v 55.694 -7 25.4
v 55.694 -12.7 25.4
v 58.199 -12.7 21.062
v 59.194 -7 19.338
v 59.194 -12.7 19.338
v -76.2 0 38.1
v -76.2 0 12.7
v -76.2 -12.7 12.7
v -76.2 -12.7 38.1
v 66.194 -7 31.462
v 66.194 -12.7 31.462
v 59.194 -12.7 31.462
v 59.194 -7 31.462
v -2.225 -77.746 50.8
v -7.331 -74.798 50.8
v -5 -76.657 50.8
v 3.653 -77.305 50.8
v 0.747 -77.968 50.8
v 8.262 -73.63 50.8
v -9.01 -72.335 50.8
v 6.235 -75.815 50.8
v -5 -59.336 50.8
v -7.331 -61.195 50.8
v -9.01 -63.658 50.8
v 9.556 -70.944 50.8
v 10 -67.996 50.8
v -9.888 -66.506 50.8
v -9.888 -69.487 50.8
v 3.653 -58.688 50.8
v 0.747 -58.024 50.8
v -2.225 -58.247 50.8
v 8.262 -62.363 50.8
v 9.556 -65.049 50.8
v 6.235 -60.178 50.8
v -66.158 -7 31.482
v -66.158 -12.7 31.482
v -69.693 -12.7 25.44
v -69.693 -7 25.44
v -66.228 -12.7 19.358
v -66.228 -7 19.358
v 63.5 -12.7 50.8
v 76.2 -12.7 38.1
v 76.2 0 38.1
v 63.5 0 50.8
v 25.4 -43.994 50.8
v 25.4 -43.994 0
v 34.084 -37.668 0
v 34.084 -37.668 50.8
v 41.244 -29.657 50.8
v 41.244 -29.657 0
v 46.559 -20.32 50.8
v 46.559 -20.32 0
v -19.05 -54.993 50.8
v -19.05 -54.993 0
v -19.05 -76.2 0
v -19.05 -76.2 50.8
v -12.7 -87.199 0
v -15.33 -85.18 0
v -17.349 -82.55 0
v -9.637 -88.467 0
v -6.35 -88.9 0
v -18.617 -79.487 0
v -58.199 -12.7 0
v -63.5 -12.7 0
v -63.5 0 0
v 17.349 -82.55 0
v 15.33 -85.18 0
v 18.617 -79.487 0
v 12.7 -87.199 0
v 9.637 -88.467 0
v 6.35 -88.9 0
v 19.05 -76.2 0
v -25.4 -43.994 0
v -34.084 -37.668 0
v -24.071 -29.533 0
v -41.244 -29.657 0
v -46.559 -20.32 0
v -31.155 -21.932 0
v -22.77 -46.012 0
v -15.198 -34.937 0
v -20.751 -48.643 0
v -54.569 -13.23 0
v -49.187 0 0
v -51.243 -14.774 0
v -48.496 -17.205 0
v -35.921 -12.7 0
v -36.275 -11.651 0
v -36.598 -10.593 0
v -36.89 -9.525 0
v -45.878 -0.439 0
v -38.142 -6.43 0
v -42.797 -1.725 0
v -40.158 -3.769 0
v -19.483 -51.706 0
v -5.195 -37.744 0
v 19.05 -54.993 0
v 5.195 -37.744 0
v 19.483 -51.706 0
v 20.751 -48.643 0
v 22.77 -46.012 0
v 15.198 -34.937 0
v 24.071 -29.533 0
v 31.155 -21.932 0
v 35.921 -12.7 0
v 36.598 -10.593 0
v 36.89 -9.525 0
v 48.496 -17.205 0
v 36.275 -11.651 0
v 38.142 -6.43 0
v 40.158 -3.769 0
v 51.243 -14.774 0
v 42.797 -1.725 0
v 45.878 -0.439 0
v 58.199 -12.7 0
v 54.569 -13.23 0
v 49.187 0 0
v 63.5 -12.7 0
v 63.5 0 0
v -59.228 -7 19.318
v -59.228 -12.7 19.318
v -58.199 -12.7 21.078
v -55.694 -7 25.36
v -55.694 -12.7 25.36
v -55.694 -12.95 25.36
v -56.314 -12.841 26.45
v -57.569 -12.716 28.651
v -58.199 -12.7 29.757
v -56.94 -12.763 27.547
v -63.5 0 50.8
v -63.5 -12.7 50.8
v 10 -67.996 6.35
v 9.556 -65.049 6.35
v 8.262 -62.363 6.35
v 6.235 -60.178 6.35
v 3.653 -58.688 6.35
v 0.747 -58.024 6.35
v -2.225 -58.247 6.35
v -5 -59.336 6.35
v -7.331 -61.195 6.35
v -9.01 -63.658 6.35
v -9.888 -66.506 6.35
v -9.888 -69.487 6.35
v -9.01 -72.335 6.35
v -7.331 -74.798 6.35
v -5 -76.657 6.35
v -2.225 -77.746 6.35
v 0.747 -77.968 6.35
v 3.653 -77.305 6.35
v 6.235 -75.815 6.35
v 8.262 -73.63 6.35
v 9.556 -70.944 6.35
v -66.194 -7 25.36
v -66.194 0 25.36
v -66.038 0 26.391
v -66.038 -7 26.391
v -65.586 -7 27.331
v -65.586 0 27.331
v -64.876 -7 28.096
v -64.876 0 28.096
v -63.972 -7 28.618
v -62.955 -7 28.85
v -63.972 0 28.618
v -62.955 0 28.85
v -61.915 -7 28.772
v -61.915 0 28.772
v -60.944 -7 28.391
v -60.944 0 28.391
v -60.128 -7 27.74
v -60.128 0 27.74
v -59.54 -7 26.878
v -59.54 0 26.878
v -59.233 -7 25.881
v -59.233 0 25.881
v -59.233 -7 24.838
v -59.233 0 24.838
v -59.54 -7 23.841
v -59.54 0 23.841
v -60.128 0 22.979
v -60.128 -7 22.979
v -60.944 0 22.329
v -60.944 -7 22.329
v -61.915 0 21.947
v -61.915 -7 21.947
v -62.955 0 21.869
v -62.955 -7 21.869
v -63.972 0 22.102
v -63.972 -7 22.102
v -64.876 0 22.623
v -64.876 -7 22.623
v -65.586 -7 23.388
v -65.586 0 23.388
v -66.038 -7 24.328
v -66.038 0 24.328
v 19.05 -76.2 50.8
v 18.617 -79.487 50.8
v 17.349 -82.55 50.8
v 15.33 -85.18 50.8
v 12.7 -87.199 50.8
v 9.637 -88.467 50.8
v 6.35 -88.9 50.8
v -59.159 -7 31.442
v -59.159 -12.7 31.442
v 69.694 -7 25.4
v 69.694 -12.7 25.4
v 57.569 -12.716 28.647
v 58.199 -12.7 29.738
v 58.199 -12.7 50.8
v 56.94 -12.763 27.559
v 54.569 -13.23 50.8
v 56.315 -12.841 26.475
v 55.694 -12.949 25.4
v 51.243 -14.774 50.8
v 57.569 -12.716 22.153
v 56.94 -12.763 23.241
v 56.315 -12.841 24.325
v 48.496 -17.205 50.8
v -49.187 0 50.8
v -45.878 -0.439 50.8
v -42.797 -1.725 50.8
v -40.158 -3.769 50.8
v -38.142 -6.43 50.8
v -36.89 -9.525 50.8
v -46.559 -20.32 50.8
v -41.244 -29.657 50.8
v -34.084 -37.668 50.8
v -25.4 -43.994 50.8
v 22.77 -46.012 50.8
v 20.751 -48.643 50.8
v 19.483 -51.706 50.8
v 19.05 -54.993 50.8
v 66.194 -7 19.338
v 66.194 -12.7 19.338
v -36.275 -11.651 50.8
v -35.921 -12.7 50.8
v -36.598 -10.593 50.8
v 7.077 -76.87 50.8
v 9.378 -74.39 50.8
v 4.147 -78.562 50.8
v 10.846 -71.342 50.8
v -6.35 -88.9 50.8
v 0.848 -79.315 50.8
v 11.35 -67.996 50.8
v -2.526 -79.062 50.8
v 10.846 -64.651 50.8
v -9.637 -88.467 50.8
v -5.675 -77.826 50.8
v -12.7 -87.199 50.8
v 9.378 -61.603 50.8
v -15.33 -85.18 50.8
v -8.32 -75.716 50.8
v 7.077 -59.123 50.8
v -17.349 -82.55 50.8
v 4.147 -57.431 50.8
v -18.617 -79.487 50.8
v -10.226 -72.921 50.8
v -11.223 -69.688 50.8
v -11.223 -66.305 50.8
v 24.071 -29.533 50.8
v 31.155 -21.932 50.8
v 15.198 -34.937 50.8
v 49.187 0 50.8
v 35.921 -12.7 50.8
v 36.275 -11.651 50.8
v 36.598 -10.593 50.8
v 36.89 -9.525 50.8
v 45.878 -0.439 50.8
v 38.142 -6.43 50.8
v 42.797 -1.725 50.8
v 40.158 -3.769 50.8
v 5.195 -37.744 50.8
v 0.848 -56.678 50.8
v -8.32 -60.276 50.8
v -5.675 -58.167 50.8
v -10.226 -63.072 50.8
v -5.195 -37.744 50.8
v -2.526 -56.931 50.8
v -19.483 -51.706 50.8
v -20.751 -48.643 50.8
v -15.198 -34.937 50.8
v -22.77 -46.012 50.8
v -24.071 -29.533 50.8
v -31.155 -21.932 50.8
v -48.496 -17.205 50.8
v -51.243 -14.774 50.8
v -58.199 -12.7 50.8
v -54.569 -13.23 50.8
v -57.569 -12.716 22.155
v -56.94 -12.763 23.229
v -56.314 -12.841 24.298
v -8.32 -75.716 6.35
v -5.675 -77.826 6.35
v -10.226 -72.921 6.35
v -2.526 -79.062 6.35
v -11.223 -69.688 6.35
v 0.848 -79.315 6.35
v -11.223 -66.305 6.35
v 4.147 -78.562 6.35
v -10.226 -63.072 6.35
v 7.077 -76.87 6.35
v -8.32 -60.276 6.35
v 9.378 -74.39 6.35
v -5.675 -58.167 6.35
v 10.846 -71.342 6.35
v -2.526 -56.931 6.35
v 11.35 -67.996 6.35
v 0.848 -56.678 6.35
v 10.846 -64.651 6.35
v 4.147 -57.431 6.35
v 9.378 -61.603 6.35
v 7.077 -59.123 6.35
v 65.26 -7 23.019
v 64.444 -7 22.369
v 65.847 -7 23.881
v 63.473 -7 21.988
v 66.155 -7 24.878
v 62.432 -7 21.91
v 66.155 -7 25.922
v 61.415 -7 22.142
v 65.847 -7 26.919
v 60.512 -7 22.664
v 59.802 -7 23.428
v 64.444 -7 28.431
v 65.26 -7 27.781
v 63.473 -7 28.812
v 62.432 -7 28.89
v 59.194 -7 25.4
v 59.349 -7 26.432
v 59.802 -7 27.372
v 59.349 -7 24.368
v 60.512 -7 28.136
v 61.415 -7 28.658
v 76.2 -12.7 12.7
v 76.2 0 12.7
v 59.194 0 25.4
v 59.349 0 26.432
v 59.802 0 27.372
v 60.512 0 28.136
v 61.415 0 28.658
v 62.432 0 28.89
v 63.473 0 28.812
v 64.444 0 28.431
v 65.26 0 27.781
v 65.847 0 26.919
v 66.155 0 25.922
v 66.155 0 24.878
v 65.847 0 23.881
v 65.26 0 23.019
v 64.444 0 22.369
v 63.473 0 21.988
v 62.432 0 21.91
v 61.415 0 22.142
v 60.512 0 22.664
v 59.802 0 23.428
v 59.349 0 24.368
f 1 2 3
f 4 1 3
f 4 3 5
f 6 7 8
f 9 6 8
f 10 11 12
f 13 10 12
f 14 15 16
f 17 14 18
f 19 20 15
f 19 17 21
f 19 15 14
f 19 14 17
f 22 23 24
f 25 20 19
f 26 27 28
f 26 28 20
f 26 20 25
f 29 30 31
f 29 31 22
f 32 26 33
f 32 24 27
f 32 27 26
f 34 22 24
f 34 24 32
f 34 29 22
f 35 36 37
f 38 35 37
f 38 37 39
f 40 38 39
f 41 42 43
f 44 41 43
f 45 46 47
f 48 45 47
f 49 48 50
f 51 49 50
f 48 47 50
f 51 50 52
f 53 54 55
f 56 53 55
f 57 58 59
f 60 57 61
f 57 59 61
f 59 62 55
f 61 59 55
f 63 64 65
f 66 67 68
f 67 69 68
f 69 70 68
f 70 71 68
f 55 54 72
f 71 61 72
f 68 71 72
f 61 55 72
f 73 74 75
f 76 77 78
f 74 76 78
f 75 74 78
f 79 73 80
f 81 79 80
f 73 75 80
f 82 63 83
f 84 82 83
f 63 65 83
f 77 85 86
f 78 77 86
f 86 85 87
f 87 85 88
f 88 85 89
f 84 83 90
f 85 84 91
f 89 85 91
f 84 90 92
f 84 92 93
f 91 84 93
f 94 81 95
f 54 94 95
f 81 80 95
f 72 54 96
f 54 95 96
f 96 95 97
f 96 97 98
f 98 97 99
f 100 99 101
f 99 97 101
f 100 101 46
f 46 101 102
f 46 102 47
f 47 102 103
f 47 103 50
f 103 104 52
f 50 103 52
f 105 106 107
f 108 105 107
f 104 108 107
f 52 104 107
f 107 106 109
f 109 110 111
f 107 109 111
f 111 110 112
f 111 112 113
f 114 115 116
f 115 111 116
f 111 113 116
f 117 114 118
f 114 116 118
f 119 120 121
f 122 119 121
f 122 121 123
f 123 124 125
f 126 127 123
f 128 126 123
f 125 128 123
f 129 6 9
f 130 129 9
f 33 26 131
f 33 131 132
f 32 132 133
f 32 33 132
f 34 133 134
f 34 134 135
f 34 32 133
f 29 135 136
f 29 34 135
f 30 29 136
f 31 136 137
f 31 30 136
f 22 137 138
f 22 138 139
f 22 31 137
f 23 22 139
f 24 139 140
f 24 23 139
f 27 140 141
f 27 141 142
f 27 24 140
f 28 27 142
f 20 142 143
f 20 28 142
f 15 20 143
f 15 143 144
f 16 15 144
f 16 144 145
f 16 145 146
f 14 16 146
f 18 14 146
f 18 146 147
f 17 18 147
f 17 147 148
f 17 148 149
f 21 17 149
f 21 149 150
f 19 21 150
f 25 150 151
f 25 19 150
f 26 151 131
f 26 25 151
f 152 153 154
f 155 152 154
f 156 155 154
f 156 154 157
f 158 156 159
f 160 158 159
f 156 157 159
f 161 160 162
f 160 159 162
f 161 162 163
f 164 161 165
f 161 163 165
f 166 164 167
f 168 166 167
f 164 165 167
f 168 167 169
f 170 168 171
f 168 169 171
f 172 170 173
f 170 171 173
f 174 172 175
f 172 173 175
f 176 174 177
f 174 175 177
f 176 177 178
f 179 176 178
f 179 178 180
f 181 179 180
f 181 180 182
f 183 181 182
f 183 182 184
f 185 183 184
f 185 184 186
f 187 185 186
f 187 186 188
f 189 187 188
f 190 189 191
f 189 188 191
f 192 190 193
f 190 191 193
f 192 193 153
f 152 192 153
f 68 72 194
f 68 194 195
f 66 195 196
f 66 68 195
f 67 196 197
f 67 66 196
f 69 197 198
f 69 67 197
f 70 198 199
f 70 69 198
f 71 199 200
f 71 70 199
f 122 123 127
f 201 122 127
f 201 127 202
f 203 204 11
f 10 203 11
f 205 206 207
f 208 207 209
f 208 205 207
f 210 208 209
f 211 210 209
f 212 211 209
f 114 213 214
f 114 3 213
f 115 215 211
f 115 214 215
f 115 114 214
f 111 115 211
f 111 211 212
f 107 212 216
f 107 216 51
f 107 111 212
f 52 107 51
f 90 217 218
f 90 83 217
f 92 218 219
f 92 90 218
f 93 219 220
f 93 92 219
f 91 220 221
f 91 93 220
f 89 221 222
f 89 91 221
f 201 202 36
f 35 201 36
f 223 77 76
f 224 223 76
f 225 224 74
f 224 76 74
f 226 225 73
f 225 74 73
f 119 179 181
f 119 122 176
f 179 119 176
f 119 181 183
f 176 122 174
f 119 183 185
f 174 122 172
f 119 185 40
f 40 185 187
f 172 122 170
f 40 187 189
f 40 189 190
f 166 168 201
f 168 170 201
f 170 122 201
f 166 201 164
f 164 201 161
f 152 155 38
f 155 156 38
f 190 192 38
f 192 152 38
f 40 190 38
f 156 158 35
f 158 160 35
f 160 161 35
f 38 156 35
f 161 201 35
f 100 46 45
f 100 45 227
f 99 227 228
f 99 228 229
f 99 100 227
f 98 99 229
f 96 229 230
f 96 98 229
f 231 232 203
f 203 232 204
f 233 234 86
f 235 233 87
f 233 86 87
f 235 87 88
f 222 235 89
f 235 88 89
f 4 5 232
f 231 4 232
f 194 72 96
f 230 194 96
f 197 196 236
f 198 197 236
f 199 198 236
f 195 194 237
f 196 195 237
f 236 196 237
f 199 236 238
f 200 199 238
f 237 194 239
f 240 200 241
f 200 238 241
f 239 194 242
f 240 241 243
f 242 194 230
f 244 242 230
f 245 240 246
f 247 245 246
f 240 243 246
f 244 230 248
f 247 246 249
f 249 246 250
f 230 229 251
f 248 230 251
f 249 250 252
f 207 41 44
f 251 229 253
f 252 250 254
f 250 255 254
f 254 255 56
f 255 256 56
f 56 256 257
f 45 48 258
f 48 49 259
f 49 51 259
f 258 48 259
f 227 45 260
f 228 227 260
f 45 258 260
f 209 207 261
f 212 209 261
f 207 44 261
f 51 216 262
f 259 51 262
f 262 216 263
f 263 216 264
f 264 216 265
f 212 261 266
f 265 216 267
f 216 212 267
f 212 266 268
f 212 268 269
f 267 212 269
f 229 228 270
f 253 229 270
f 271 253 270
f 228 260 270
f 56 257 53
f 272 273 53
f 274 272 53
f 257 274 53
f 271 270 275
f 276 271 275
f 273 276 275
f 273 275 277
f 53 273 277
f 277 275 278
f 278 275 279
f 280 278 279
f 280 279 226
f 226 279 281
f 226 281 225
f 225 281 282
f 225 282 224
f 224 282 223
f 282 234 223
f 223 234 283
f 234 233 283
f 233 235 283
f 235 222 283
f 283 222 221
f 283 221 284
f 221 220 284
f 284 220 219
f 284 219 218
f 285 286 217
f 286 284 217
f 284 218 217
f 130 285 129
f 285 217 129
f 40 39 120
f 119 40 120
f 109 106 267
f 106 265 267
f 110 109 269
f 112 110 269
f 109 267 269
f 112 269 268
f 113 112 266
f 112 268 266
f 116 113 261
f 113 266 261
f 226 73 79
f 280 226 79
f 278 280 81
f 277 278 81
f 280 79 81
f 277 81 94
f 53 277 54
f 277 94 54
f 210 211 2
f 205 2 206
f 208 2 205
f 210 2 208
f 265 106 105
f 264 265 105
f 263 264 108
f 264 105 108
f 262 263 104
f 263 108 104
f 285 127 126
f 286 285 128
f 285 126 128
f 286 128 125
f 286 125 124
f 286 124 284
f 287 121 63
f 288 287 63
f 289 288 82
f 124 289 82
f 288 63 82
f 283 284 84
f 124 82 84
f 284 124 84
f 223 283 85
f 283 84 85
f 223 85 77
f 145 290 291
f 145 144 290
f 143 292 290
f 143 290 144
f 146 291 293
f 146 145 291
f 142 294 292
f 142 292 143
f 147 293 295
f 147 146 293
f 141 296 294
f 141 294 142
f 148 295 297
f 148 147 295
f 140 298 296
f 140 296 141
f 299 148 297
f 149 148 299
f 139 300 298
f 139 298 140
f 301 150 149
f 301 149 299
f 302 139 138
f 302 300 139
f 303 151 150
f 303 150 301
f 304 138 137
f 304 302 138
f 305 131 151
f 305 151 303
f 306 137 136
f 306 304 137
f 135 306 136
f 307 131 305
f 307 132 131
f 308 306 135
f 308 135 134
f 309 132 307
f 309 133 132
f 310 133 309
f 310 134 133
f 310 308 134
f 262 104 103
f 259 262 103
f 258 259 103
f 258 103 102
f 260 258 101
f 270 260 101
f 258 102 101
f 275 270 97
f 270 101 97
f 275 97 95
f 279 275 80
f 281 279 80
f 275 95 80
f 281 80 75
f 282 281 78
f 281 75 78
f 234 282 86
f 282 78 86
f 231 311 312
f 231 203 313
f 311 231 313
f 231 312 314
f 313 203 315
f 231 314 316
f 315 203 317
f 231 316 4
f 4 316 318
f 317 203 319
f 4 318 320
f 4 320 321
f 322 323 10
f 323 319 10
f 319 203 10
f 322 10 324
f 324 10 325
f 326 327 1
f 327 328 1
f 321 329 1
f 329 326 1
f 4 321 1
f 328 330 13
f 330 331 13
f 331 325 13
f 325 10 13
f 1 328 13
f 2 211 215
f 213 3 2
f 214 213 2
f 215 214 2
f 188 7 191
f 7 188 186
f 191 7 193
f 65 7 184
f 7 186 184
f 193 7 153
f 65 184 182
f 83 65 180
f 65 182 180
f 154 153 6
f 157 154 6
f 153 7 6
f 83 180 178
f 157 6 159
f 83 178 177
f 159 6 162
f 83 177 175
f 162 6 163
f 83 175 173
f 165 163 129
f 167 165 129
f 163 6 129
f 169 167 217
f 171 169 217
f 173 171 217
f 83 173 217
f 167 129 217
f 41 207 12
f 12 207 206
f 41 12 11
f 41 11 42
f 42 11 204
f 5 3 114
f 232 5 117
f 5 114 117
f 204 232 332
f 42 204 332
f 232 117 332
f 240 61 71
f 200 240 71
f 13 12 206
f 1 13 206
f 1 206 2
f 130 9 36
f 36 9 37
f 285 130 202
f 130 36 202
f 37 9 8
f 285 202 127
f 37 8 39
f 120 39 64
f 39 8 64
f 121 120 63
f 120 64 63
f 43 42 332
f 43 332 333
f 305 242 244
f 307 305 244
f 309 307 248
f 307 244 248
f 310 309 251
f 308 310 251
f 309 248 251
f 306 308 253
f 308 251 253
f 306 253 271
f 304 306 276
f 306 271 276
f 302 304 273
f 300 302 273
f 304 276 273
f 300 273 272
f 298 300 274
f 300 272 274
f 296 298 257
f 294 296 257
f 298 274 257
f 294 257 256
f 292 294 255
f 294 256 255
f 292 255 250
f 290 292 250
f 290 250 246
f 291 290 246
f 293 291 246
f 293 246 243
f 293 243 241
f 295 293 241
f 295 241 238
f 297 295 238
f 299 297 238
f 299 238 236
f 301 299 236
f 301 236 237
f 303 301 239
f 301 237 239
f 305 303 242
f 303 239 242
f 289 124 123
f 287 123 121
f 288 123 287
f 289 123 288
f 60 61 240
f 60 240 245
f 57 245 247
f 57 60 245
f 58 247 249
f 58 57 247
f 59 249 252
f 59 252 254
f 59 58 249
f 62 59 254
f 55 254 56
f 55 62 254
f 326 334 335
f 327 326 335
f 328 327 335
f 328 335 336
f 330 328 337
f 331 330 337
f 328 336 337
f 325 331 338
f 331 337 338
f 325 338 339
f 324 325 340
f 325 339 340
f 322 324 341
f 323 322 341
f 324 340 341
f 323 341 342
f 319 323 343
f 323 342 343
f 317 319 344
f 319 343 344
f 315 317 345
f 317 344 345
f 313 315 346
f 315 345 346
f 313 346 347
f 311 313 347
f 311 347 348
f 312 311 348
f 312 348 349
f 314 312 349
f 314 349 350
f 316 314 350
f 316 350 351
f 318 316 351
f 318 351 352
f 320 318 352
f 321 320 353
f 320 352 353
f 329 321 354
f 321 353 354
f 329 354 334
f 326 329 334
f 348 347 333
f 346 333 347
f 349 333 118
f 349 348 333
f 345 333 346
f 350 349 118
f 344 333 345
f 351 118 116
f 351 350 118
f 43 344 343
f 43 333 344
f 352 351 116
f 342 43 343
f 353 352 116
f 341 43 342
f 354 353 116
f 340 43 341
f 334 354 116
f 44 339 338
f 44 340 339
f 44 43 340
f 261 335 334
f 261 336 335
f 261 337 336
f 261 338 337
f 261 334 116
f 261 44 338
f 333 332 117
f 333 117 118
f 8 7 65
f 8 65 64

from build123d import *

# Parameters (mm, degrees)
F1_DEPTH     = 50.8
F3_DEPTH     = 12.7
F4_SIZE      = 12.7
F5_R         = 11.35
F5_R_2       = 10
F6_DEPTH     = 44.45
F7_T1_DEPTH  = 50.8
F7_T6_DEPTH  = 73.3295570728
F7_T11_DEPTH = 73.3295570728
F7_T16_DEPTH = 73.3295570728
F7_T21_DEPTH = 73.3295570728
F7_T23_DEPTH = 114.3
F8_R         = 3.5
F9_DEPTH     = 50.801
F10_W        = 183.8439181447
F10_H        = 157.3934331536
F11_DEPTH    = 63.5
F12_R        = 12.7
F13_R        = 3.5
F13_W        = 17.6573731005
F13_H        = 18.0775066838
F14_DEPTH    = 7


# Not quite as in the source:
# - a fillet or chamfer that OpenCascade refuses, or shapes differently, is made with other operations: its cross-section is extruded or revolved along the edge and cut away or added


with BuildPart() as f1:
    # F0 (on Top) → F1 (new body)
    with BuildSketch(Plane.XY):
        with BuildLine():
            ThreePointArc((-35.9210244843, 12.7), (0, 38.1), (35.9210244843, 12.7))
            Line((35.9210244843, 12.7), (49.1868884968, 12.7))
            ThreePointArc((49.1868884968, 12.7), (0, 50.8), (-49.1868884968, 12.7))
            Line((-49.1868884968, 12.7), (-35.9210244843, 12.7))
        make_face()
        with BuildLine():
            ThreePointArc((-49.1868884968, -12.7), (-50.8, 0), (-49.1868884968, 12.7))
            Line((-49.1868884968, 12.7), (-76.2, 12.7))
            Line((-76.2, 12.7), (-76.2, -12.7))
            Line((-76.2, -12.7), (-49.1868884968, -12.7))
        make_face()
        with BuildLine():
            ThreePointArc((-35.9210244843, -12.7), (-38.1, 0), (-35.9210244843, 12.7))
            Line((-35.9210244843, 12.7), (-49.1868884968, 12.7))
            ThreePointArc((-49.1868884968, 12.7), (-50.8, 0), (-49.1868884968, -12.7))
            Line((-49.1868884968, -12.7), (-35.9210244843, -12.7))
        make_face()
        with BuildLine():
            ThreePointArc((35.9210244843, 12.7), (37.5513051228, 6.4427853895), (38.1, 0))
            ThreePointArc((38.1, 0), (37.5513051228, -6.4427853895), (35.9210244843, -12.7))
            Line((35.9210244843, -12.7), (49.1868884968, -12.7))
            ThreePointArc((49.1868884968, -12.7), (50.3951085704, -6.4010180581), (50.8, 0))
            ThreePointArc((50.8, 0), (50.3951085704, 6.4010180581), (49.1868884968, 12.7))
            Line((49.1868884968, 12.7), (35.9210244843, 12.7))
        make_face()
        with BuildLine():
            Line((76.2, 12.7), (49.1868884968, 12.7))
            ThreePointArc((49.1868884968, 12.7), (50.3951085704, 6.4010180581), (50.8, 0))
            ThreePointArc((50.8, 0), (50.3951085704, -6.4010180581), (49.1868884968, -12.7))
            Line((49.1868884968, -12.7), (76.2, -12.7))
            Line((76.2, -12.7), (76.2, 12.7))
        make_face()
        with BuildLine():
            ThreePointArc((-19.05, -32.9955678842), (-29.2989914869, -24.3552683798), (-35.9210244843, -12.7))
            Line((-35.9210244843, -12.7), (-49.1868884968, -12.7))
            ThreePointArc((-49.1868884968, -12.7), (-38.2071387235, -33.479165918), (-19.05, -47.0928603931))
            Line((-19.05, -47.0928603931), (-19.05, -32.9955678842))
        make_face()
        with BuildLine():
            Line((49.1868884968, -12.7), (35.9210244843, -12.7))
            ThreePointArc((35.9210244843, -12.7), (29.2989914869, -24.3552683798), (19.05, -32.9955678842))
            Line((19.05, -32.9955678842), (19.05, -47.0928603931))
            ThreePointArc((19.05, -47.0928603931), (38.2071387235, -33.479165918), (49.1868884968, -12.7))
        make_face()
        with BuildLine():
            Line((19.05, -47.0928603931), (19.05, -32.9955678842))
            ThreePointArc((19.05, -32.9955678842), (0, -38.1), (-19.05, -32.9955678842))
            Line((-19.05, -32.9955678842), (-19.05, -47.0928603931))
            ThreePointArc((-19.05, -47.0928603931), (0, -50.8), (19.05, -47.0928603931))
        make_face()
        with BuildLine():
            Line((19.05, -88.9), (19.05, -47.0928603931))
            ThreePointArc((19.05, -47.0928603931), (0, -50.8), (-19.05, -47.0928603931))
            Line((-19.05, -47.0928603931), (-19.05, -88.9))
            Line((-19.05, -88.9), (19.05, -88.9))
        make_face()
    extrude(amount=F1_DEPTH)

    # F2 (on face) → F3 (cut)
    with BuildSketch(Plane.XZ.offset(12.7)):
        Polygon((-55.6935602012, 25.3597094836), (-59.1586096141, 31.4419321502), (-66.1584936613, 31.4822226666), (-69.6933282956, 25.4402905164), (-66.2282788827, 19.3580678498), (-59.2283948355, 19.3177773334), align=None)
        Polygon((59.1938884968, 31.4621778265), (55.6938884968, 25.4), (59.1938884968, 19.3378221735), (66.1938884968, 19.3378221735), (69.6938884968, 25.4), (66.1938884968, 31.4621778265), align=None)
    extrude(amount=-F3_DEPTH, mode=Mode.SUBTRACT)

    # F4
    f4_edges = [f1.edges().sort_by_distance(p)[0] for p in [
        (-76.2, 0, 50.8),
        (-76.2, 0, 0),
        (76.2, 0, 50.8),
        (76.2, 0, 0),
    ]]
    chamfer(f4_edges, length=F4_SIZE)

    # F5 (on face) → F6 (cut)
    with BuildSketch(Plane.XY.offset(50.8)):
        with Locations((0, -67.9964301965)):
            Circle(F5_R)
        with Locations((0, -67.9964301965)):
            Circle(F5_R_2, mode=Mode.SUBTRACT)
    extrude(amount=-F6_DEPTH, mode=Mode.SUBTRACT)

    # F7: fillet of radius 12.7 on 8 edges, made by hand

    # F7_s2 → F7_t1 (join)
    with BuildSketch(Plane.XY):
        with BuildLine():
            ThreePointArc((-25.4, -43.9940905122), (-20.7514773719, -48.6426131403), (-19.05, -54.9926131403))
            Line((-19.05, -54.9926131403), (-19.05, -47.0928603931))
            ThreePointArc((-19.05, -47.0928603931), (-22.2789411484, -45.6540116672), (-25.4, -43.9940905122))
        make_face()
        with BuildLine():
            ThreePointArc((25.4, -43.9940905122), (20.7514773719, -48.6426131403), (19.05, -54.9926131403))
            Line((19.05, -54.9926131403), (19.05, -47.0928603931))
            ThreePointArc((19.05, -47.0928603931), (22.2789411484, -45.6540116672), (25.4, -43.9940905122))
        make_face()
    extrude(amount=F7_T1_DEPTH)


with BuildPart() as f7_tool4:
    # F7_s5 → F7_t6 (new body)
    with BuildSketch(Plane.XY):
        with BuildLine():
            ThreePointArc((58.1987113259, -12.7), (51.2426348456, -14.774417663), (46.5589690608, -20.32))
            ThreePointArc((46.5589690608, -20.32), (48.0243002017, -16.562203662), (49.1868884968, -12.7))
            Line((49.1868884968, -12.7), (58.1987113259, -12.7))
        make_face()
    extrude(amount=F7_T6_DEPTH)

    split(bisect_by=Plane(origin=(52.7689390007, 0, 30.4661611369), x_dir=(0, 1, 0), z_dir=(-0.8660254038, 0, -0.5)), keep=Keep.TOP)


with BuildPart() as f1_1:
    add(f1.part)

    # F7_t3: union F7_tool4
    add(f7_tool4.part)


with BuildPart() as f7_tool9:
    # F7_s10 → F7_t11 (new body)
    with BuildSketch(Plane.XY.offset(-22.5295570728)):
        with BuildLine():
            ThreePointArc((58.1987113259, -12.7), (51.2426348456, -14.774417663), (46.5589690608, -20.32))
            ThreePointArc((46.5589690608, -20.32), (48.0243002017, -16.562203662), (49.1868884968, -12.7))
            Line((49.1868884968, -12.7), (58.1987113259, -12.7))
        make_face()
    extrude(amount=F7_T11_DEPTH)

    split(bisect_by=Plane(origin=(30.7718937446, 0, -17.7661611369), x_dir=(0, 1, 0), z_dir=(-0.8660254038, 0, 0.5)), keep=Keep.TOP)


with BuildPart() as f1_2:
    add(f1_1.part)

    # F7_t8: union F7_tool9
    add(f7_tool9.part)


with BuildPart() as f7_tool14:
    # F7_s15 → F7_t16 (new body)
    with BuildSketch(Plane.XY):
        with BuildLine():
            ThreePointArc((-58.1987113259, -12.7), (-51.2426348456, -14.774417663), (-46.5589690608, -20.32))
            ThreePointArc((-46.5589690608, -20.32), (-48.0243002017, -16.562203662), (-49.1868884968, -12.7))
            Line((-49.1868884968, -12.7), (-58.1987113259, -12.7))
        make_face()
    extrude(amount=F7_T16_DEPTH)

    split(bisect_by=Plane(origin=(-52.5449689068, 0, 30.7414534512), x_dir=(0, 1, 0), z_dir=(0.8631331643, 0, -0.5049763763)), keep=Keep.TOP)


with BuildPart() as f1_3:
    add(f1_2.part)

    # F7_t13: union F7_tool14
    add(f7_tool14.part)


with BuildPart() as f7_tool19:
    # F7_s20 → F7_t21 (new body)
    with BuildSketch(Plane.XY.offset(-22.5295570728)):
        with BuildLine():
            ThreePointArc((-58.1987113259, -12.7), (-51.2426348456, -14.774417663), (-46.5589690608, -20.32))
            ThreePointArc((-46.5589690608, -20.32), (-48.0243002017, -16.562203662), (-49.1868884968, -12.7))
            Line((-49.1868884968, -12.7), (-58.1987113259, -12.7))
        make_face()
    extrude(amount=F7_T21_DEPTH)

    split(bisect_by=Plane(origin=(-31.1394890128, 0, -17.7402035465), x_dir=(0, 1, 0), z_dir=(0.8688889524, 0, 0.495007059)), keep=Keep.TOP)


with BuildPart() as f1_4:
    add(f1_3.part)

    # F7_t18: union F7_tool19
    add(f7_tool19.part)

    # F7_s24 → F7_t23 (cut)
    with BuildSketch(Plane.XY.offset(-31.75)):
        with BuildLine():
            ThreePointArc((-6.35, -88.9), (-15.3302561211, -85.1802561211), (-19.05, -76.2))
            Line((-19.05, -76.2), (-19.05, -88.9))
            Line((-19.05, -88.9), (-6.35, -88.9))
        make_face()
        with BuildLine():
            ThreePointArc((19.05, -76.2), (15.3302561211, -85.1802561211), (6.35, -88.9))
            Line((6.35, -88.9), (19.05, -88.9))
            Line((19.05, -88.9), (19.05, -76.2))
        make_face()
    extrude(amount=F7_T23_DEPTH, mode=Mode.SUBTRACT)

    # F8 (on face) → F9 (cut, through all)
    with BuildSketch(Plane.XZ):
        with Locations((-62.6585516377, 25.4402905164)):
            Circle(F8_R)
        with Locations((62.6938884968, 25.4402905164)):
            Circle(F8_R)
    extrude(amount=-F9_DEPTH, mode=Mode.SUBTRACT)

    # F10 (on Front) → F11 (cut)
    with BuildSketch(Plane.XZ):
        with Locations((-6.0164444149, -2.5229565799)):
            Rectangle(F10_W, F10_H)
    extrude(amount=-F11_DEPTH, mode=Mode.SUBTRACT)

    # F12
    f12_edges = [f1_4.edges().sort_by_distance(p)[0] for p in [
        (38.1, 0, 25.4),
        (-38.1, 0, 25.4),
    ]]
    fillet(f12_edges, radius=F12_R)

    # F13 (on face) → F14 (join)
    with BuildSketch(Plane(origin=(0, 0, 0), x_dir=(-1, 0, 0), z_dir=(0, 1, 0))):
        Polygon((-55.6938884968, 25.4), (-59.1938884968, 31.4621778265), (-66.1938884968, 31.4621778265), (-69.6938884968, 25.4), (-66.1938884968, 19.3378221735), (-59.1938884968, 19.3378221735), align=None)
        with Locations((-62.6938884968, 25.4)):
            Circle(F13_R, mode=Mode.SUBTRACT)
        with Locations((63.3883532137, 24.6192668565)):
            Rectangle(F13_W, F13_H)
        with Locations((62.6936761559, 25.3597094836)):
            Circle(F13_R, mode=Mode.SUBTRACT)
    extrude(amount=-F14_DEPTH)


solid = f1_4.part
